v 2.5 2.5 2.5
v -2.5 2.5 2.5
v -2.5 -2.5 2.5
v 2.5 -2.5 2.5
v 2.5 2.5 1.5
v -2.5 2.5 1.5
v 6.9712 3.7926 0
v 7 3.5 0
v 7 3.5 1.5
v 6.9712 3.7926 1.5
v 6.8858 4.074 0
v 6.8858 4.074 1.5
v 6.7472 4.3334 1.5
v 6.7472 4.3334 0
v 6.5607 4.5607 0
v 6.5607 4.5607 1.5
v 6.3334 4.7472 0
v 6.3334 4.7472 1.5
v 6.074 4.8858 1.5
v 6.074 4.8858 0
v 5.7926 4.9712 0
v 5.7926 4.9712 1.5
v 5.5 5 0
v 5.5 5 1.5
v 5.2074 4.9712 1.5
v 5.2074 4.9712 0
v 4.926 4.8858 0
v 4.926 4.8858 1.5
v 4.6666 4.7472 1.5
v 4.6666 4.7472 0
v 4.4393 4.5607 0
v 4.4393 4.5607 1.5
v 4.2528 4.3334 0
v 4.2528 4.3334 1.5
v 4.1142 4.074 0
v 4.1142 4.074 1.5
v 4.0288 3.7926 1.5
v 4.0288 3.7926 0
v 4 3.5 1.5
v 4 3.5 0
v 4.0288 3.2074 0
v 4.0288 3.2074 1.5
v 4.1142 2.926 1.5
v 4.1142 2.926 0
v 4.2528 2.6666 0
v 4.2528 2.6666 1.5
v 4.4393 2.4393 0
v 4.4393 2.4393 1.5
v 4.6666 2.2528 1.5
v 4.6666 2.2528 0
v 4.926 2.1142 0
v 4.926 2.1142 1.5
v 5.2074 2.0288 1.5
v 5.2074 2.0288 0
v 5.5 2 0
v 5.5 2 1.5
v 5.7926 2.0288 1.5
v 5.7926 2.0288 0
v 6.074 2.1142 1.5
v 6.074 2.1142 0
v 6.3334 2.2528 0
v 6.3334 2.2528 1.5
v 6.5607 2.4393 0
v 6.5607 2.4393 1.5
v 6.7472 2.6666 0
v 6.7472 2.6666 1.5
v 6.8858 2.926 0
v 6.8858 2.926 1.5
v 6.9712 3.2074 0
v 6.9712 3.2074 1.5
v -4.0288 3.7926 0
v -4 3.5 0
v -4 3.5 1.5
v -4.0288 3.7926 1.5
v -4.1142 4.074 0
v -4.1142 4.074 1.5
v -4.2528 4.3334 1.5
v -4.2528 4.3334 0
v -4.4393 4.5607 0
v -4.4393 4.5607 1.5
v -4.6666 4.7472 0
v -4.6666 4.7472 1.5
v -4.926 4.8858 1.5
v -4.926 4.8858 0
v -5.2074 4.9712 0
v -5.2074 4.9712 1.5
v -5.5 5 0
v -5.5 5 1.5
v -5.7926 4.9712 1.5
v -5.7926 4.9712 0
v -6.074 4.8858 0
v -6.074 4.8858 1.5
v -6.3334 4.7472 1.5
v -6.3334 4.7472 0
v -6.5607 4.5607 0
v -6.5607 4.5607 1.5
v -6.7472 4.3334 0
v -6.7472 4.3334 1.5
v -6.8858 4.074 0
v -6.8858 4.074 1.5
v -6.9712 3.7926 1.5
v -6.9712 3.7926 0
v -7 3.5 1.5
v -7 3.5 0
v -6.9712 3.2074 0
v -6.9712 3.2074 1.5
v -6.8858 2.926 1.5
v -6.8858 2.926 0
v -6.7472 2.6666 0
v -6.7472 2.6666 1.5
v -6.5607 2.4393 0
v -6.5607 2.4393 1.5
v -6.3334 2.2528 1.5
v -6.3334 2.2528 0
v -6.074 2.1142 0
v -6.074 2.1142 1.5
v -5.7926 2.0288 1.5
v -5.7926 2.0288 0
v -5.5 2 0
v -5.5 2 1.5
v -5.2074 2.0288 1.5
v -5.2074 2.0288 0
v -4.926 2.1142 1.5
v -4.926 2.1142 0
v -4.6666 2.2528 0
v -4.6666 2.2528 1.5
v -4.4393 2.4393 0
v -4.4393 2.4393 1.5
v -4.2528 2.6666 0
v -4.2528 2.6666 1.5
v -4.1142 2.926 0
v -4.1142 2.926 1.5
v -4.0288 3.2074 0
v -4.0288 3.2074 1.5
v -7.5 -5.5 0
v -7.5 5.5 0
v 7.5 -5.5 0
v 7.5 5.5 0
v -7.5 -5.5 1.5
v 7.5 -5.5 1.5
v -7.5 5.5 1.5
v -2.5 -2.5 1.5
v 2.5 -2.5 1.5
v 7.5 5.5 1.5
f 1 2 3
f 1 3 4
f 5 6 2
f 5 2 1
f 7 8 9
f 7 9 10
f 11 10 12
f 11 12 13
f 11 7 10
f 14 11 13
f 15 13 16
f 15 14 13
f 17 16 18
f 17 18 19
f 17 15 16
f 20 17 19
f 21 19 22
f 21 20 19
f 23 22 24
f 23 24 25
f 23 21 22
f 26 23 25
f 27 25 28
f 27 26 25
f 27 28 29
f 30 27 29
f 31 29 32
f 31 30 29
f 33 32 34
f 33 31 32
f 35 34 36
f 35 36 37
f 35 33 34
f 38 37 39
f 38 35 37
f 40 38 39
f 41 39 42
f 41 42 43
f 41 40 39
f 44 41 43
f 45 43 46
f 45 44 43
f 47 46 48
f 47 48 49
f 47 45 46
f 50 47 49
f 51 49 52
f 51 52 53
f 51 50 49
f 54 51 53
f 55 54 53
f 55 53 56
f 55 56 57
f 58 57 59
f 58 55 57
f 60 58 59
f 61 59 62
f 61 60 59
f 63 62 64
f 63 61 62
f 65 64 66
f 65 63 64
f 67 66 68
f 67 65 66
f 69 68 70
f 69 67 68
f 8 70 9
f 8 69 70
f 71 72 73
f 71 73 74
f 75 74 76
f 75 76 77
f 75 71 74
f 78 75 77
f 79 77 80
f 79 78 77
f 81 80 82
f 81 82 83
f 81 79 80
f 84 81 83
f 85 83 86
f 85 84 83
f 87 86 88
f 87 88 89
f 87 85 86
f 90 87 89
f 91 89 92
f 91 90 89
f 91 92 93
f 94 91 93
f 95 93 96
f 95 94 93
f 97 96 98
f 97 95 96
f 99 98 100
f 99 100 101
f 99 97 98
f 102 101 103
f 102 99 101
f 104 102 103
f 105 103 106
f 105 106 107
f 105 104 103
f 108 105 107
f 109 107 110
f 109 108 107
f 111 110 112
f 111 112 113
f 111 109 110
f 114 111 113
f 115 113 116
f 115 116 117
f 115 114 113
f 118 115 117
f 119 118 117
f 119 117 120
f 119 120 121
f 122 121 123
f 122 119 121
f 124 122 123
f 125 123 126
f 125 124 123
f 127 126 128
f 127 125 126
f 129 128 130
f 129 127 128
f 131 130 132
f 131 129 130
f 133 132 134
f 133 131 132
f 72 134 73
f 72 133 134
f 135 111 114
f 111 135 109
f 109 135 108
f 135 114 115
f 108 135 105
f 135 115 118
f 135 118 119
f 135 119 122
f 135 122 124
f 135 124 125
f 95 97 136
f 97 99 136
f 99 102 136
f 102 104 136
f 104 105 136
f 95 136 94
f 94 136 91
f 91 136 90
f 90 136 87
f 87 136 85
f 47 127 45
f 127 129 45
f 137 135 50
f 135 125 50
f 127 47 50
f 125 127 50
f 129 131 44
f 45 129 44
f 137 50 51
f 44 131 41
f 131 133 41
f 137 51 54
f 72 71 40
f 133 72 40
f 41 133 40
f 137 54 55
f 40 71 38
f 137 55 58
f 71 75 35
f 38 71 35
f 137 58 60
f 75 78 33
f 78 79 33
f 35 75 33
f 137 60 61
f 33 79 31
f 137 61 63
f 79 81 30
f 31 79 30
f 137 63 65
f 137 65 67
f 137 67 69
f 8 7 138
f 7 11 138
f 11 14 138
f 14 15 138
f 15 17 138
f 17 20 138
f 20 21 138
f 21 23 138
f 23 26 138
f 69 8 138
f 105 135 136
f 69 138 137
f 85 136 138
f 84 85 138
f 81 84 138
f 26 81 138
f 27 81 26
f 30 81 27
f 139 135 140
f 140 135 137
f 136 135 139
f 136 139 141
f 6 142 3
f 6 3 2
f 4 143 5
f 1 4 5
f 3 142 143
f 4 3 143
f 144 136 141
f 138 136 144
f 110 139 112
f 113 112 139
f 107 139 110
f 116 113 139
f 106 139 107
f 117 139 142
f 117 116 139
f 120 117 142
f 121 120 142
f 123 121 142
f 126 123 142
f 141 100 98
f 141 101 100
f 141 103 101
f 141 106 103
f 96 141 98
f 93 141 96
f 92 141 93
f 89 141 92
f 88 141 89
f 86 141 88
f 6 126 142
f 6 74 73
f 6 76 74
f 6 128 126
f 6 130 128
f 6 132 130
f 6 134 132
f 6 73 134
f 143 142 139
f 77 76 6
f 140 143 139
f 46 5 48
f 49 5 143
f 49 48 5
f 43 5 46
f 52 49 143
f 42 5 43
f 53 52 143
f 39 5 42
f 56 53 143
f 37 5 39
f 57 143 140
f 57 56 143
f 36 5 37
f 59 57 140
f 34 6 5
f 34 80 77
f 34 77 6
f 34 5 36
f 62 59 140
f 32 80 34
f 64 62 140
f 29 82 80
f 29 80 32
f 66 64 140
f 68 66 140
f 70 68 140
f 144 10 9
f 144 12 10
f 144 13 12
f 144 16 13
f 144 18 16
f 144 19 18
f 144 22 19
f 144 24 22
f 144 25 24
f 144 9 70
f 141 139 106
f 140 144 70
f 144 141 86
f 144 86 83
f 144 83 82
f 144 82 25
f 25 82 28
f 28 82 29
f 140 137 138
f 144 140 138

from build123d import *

# Parameters (mm, degrees)
SKETCH_1_W      = 15
SKETCH_1_H      = 11
SKETCH_1_R      = 1.5
EXTRUDE_1_DEPTH = 1.5
SKETCH_2_W      = 5
SKETCH_2_H      = 5
EXTRUDE_2_DEPTH = 1


with BuildPart() as part:
    # 草图1 → 凸台-拉伸1 (new body)
    with BuildSketch(Plane.XY):
        Rectangle(SKETCH_1_W, SKETCH_1_H)
        with Locations((-5.5, 3.5)):
            Circle(SKETCH_1_R, mode=Mode.SUBTRACT)
        with Locations((5.5, 3.5)):
            Circle(SKETCH_1_R, mode=Mode.SUBTRACT)
    extrude(amount=EXTRUDE_1_DEPTH)

    # 草图2 → 凸台-拉伸2 (add)
    with BuildSketch(Plane.XY.offset(1.5)):
        Rectangle(SKETCH_2_W, SKETCH_2_H)
    extrude(amount=EXTRUDE_2_DEPTH)


solid = part.part
